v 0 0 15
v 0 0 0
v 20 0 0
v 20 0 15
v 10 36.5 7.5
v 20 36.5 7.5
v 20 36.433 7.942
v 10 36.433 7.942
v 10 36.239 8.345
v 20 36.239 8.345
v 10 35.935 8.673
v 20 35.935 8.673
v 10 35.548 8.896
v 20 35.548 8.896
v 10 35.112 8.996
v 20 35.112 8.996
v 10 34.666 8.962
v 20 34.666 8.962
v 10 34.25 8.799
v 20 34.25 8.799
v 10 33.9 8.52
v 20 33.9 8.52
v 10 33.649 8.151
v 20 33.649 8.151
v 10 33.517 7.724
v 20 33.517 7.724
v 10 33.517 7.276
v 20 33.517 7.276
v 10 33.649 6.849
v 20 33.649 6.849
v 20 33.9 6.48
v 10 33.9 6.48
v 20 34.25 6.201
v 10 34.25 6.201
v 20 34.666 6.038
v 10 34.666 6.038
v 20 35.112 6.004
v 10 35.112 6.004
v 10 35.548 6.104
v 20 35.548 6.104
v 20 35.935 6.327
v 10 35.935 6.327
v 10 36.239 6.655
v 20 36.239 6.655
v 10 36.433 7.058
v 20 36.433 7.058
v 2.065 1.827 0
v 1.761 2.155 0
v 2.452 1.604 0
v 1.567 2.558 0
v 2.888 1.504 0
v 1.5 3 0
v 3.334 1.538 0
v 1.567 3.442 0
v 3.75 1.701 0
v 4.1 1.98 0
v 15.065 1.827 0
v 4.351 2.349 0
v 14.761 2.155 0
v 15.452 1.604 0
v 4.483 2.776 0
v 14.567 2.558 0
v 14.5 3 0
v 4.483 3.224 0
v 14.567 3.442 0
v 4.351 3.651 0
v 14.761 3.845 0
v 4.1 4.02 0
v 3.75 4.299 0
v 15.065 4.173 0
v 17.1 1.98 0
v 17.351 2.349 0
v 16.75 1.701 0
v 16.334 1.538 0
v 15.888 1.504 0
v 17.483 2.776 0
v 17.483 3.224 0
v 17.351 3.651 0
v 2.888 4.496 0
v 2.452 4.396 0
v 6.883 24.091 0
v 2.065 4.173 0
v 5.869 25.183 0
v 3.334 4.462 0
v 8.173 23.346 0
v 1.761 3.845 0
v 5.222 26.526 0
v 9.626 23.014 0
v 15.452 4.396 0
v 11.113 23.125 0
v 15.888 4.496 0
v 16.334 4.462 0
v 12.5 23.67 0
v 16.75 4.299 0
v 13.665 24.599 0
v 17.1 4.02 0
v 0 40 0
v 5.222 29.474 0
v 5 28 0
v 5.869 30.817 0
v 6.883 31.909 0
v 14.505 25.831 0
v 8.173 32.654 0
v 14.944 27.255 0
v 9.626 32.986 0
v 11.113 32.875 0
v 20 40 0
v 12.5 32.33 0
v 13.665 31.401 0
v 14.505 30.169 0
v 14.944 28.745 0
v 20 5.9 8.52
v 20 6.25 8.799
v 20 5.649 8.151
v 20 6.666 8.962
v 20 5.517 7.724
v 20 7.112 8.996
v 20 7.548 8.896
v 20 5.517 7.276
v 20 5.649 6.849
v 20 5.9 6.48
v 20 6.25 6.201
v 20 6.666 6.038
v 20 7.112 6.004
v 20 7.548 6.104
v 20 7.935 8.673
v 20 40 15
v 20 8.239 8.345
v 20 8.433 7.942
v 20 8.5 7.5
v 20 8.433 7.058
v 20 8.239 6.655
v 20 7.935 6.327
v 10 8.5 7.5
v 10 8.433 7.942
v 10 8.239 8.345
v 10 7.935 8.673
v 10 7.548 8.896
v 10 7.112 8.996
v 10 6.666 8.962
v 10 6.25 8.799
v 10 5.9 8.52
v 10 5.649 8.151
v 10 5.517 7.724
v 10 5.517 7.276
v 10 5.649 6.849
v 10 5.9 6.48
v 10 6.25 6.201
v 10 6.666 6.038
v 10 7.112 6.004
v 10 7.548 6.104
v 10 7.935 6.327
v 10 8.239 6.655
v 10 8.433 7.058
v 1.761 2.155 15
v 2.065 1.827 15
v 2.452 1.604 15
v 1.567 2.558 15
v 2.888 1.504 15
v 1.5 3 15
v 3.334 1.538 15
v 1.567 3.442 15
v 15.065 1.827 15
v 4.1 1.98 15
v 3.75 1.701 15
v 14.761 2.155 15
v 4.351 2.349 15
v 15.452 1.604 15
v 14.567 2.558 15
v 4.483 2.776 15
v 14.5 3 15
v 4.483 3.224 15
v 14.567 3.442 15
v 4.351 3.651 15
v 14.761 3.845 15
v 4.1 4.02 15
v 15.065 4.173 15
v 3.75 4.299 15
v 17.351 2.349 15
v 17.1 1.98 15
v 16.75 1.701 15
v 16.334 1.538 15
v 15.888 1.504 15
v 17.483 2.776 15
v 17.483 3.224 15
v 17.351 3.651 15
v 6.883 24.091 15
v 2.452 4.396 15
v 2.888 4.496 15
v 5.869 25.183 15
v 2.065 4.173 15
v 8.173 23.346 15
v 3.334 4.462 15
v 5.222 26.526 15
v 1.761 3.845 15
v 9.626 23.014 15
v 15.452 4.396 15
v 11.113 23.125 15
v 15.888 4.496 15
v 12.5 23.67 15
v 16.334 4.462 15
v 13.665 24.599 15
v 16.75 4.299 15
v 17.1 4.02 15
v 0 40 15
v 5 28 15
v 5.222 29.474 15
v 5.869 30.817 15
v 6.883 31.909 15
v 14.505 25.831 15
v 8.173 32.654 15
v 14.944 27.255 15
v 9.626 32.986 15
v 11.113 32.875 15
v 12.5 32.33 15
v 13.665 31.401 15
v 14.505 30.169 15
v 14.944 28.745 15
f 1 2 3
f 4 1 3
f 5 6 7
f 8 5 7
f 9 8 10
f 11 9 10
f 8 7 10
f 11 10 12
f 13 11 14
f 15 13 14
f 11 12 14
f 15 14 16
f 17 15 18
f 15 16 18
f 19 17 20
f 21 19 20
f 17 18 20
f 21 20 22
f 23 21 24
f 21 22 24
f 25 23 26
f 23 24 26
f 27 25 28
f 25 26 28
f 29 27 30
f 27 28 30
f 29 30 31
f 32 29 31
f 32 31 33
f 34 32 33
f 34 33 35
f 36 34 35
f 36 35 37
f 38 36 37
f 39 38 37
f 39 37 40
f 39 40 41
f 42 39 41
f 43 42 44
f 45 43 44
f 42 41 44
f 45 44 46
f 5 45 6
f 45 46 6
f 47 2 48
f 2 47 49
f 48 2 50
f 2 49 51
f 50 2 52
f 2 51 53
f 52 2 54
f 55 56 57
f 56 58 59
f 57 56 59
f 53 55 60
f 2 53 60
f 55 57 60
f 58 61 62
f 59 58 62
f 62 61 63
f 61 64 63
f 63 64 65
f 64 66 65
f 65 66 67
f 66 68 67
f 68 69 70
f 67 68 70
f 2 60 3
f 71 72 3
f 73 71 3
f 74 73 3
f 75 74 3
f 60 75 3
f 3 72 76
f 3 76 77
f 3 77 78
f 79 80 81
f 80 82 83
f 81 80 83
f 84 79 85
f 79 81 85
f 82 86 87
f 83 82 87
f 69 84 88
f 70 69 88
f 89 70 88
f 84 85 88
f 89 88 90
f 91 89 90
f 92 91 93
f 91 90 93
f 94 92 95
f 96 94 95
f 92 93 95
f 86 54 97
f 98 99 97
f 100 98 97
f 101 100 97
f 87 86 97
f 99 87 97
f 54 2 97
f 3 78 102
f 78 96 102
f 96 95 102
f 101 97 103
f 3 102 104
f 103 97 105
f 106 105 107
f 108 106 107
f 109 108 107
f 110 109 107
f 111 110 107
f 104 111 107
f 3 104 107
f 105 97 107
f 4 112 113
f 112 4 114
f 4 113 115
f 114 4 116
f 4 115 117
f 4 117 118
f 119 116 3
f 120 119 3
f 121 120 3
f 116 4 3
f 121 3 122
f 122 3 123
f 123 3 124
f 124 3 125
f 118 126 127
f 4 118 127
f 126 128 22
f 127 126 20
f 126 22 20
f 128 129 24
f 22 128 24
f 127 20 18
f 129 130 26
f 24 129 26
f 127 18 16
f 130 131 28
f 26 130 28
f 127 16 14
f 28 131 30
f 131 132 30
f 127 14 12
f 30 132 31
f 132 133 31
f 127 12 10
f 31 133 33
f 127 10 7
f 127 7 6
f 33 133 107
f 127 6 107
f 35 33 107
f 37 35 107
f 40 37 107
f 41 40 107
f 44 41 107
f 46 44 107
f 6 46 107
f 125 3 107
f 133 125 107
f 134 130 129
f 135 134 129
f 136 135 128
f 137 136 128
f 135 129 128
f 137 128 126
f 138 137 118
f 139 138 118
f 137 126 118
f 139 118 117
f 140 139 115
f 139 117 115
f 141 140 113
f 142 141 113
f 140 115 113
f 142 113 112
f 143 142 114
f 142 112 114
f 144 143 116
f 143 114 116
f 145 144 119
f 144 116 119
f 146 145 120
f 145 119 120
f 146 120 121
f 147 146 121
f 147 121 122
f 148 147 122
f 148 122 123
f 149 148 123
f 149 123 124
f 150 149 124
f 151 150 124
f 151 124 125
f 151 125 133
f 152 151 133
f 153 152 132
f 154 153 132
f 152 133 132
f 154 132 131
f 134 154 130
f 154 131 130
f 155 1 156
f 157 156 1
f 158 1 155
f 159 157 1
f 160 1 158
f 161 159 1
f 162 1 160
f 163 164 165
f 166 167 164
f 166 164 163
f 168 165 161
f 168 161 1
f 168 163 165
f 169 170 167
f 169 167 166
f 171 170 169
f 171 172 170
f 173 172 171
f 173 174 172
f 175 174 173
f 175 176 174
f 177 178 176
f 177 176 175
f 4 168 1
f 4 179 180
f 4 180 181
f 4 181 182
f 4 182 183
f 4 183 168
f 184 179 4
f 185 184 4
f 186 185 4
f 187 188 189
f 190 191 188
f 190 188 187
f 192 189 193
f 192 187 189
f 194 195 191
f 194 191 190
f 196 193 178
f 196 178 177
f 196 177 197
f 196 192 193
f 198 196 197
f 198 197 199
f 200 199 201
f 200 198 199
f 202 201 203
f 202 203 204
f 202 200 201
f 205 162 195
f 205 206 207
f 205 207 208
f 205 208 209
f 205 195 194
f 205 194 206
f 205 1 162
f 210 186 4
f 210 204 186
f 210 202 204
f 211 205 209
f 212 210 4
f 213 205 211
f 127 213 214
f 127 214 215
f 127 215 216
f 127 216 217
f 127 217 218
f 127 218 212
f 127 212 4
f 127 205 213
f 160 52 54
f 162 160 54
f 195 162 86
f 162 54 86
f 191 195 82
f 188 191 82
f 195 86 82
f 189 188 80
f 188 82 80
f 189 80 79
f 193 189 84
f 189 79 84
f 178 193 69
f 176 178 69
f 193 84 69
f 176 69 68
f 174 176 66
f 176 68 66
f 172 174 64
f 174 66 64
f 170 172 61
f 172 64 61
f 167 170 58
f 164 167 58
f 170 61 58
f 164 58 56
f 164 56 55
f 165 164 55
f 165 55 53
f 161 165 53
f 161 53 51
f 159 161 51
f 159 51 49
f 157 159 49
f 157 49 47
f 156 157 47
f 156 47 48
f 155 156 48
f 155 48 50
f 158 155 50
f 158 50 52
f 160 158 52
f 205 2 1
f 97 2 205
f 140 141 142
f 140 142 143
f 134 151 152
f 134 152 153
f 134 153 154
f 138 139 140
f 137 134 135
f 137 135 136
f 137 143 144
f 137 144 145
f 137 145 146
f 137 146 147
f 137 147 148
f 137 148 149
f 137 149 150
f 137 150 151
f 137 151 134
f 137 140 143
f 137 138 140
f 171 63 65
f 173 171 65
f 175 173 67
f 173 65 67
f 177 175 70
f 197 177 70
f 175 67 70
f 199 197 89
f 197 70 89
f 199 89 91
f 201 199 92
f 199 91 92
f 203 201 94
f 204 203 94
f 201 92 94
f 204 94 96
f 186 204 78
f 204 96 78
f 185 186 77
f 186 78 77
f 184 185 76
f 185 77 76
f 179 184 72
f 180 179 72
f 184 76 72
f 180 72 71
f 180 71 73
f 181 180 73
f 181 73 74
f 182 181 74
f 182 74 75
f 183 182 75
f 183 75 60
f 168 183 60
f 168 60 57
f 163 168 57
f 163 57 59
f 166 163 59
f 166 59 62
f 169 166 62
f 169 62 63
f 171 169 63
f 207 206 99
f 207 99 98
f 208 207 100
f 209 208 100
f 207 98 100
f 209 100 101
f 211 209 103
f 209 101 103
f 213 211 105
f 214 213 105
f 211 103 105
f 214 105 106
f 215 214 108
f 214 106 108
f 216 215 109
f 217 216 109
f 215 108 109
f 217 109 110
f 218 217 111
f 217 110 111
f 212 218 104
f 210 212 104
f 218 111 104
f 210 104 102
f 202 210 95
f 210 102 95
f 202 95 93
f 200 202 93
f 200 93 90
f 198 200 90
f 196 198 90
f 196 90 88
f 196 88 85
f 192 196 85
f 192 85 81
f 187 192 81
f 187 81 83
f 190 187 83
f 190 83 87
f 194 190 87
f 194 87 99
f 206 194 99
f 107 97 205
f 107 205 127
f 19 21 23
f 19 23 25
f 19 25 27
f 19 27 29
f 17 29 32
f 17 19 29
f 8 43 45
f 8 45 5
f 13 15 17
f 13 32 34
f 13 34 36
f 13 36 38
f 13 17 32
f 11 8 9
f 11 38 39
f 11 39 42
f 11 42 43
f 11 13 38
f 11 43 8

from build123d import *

# Parameters (mm, degrees)
ESQUISSE1_W             = 20
ESQUISSE1_H             = 40
BOSS_EXTRU_1_DEPTH      = 15
ESQUISSE2_R             = 1.5
ENL_V_MAT_EXTRU_1_DEPTH = 10
ESQUISSE3_R             = 1.5
ENL_V_MAT_EXTRU_2_DEPTH = 48.16990566
ESQUISSE4_R             = 5
ENL_V_MAT_EXTRU_3_DEPTH = 48.16990566


with BuildPart() as part:
    # Esquisse1 → Boss.-Extru.1 (new body)
    with BuildSketch(Plane.XY):
        with Locations((10, 20)):
            Rectangle(ESQUISSE1_W, ESQUISSE1_H)
    extrude(amount=BOSS_EXTRU_1_DEPTH)

    # Esquisse2 → Enlèv. mat.-Extru.1 (cut)
    with BuildSketch(Plane(origin=(20, 0, 0), x_dir=(0, 0, -1), z_dir=(1, 0, 0))):
        with Locations(Location((-7.5, 35, 0), (0, 0, 90))):
            Circle(ESQUISSE2_R)
        with Locations(Location((-7.5, 7, 0), (0, 0, 90))):
            Circle(ESQUISSE2_R)
    extrude(amount=-ENL_V_MAT_EXTRU_1_DEPTH, mode=Mode.SUBTRACT)

    # Esquisse3 → Enlèv. mat.-Extru.2 (cut, through all)
    with BuildSketch(Plane(origin=(0, 0, 0), x_dir=(-1, 0, 0), z_dir=(0, 0, -1))):
        with Locations((-16, 3)):
            Circle(ESQUISSE3_R)
        with Locations((-3, 3)):
            Circle(ESQUISSE3_R)
    extrude(amount=-ENL_V_MAT_EXTRU_2_DEPTH, mode=Mode.SUBTRACT)

    # Esquisse4 → Enlèv. mat.-Extru.3 (cut, through all)
    with BuildSketch(Plane(origin=(0, 0, 0), x_dir=(-1, 0, 0), z_dir=(0, 0, -1))):
        with Locations((-10, 28)):
            Circle(ESQUISSE4_R)
    extrude(amount=-ENL_V_MAT_EXTRU_3_DEPTH, mode=Mode.SUBTRACT)


solid = part.part
